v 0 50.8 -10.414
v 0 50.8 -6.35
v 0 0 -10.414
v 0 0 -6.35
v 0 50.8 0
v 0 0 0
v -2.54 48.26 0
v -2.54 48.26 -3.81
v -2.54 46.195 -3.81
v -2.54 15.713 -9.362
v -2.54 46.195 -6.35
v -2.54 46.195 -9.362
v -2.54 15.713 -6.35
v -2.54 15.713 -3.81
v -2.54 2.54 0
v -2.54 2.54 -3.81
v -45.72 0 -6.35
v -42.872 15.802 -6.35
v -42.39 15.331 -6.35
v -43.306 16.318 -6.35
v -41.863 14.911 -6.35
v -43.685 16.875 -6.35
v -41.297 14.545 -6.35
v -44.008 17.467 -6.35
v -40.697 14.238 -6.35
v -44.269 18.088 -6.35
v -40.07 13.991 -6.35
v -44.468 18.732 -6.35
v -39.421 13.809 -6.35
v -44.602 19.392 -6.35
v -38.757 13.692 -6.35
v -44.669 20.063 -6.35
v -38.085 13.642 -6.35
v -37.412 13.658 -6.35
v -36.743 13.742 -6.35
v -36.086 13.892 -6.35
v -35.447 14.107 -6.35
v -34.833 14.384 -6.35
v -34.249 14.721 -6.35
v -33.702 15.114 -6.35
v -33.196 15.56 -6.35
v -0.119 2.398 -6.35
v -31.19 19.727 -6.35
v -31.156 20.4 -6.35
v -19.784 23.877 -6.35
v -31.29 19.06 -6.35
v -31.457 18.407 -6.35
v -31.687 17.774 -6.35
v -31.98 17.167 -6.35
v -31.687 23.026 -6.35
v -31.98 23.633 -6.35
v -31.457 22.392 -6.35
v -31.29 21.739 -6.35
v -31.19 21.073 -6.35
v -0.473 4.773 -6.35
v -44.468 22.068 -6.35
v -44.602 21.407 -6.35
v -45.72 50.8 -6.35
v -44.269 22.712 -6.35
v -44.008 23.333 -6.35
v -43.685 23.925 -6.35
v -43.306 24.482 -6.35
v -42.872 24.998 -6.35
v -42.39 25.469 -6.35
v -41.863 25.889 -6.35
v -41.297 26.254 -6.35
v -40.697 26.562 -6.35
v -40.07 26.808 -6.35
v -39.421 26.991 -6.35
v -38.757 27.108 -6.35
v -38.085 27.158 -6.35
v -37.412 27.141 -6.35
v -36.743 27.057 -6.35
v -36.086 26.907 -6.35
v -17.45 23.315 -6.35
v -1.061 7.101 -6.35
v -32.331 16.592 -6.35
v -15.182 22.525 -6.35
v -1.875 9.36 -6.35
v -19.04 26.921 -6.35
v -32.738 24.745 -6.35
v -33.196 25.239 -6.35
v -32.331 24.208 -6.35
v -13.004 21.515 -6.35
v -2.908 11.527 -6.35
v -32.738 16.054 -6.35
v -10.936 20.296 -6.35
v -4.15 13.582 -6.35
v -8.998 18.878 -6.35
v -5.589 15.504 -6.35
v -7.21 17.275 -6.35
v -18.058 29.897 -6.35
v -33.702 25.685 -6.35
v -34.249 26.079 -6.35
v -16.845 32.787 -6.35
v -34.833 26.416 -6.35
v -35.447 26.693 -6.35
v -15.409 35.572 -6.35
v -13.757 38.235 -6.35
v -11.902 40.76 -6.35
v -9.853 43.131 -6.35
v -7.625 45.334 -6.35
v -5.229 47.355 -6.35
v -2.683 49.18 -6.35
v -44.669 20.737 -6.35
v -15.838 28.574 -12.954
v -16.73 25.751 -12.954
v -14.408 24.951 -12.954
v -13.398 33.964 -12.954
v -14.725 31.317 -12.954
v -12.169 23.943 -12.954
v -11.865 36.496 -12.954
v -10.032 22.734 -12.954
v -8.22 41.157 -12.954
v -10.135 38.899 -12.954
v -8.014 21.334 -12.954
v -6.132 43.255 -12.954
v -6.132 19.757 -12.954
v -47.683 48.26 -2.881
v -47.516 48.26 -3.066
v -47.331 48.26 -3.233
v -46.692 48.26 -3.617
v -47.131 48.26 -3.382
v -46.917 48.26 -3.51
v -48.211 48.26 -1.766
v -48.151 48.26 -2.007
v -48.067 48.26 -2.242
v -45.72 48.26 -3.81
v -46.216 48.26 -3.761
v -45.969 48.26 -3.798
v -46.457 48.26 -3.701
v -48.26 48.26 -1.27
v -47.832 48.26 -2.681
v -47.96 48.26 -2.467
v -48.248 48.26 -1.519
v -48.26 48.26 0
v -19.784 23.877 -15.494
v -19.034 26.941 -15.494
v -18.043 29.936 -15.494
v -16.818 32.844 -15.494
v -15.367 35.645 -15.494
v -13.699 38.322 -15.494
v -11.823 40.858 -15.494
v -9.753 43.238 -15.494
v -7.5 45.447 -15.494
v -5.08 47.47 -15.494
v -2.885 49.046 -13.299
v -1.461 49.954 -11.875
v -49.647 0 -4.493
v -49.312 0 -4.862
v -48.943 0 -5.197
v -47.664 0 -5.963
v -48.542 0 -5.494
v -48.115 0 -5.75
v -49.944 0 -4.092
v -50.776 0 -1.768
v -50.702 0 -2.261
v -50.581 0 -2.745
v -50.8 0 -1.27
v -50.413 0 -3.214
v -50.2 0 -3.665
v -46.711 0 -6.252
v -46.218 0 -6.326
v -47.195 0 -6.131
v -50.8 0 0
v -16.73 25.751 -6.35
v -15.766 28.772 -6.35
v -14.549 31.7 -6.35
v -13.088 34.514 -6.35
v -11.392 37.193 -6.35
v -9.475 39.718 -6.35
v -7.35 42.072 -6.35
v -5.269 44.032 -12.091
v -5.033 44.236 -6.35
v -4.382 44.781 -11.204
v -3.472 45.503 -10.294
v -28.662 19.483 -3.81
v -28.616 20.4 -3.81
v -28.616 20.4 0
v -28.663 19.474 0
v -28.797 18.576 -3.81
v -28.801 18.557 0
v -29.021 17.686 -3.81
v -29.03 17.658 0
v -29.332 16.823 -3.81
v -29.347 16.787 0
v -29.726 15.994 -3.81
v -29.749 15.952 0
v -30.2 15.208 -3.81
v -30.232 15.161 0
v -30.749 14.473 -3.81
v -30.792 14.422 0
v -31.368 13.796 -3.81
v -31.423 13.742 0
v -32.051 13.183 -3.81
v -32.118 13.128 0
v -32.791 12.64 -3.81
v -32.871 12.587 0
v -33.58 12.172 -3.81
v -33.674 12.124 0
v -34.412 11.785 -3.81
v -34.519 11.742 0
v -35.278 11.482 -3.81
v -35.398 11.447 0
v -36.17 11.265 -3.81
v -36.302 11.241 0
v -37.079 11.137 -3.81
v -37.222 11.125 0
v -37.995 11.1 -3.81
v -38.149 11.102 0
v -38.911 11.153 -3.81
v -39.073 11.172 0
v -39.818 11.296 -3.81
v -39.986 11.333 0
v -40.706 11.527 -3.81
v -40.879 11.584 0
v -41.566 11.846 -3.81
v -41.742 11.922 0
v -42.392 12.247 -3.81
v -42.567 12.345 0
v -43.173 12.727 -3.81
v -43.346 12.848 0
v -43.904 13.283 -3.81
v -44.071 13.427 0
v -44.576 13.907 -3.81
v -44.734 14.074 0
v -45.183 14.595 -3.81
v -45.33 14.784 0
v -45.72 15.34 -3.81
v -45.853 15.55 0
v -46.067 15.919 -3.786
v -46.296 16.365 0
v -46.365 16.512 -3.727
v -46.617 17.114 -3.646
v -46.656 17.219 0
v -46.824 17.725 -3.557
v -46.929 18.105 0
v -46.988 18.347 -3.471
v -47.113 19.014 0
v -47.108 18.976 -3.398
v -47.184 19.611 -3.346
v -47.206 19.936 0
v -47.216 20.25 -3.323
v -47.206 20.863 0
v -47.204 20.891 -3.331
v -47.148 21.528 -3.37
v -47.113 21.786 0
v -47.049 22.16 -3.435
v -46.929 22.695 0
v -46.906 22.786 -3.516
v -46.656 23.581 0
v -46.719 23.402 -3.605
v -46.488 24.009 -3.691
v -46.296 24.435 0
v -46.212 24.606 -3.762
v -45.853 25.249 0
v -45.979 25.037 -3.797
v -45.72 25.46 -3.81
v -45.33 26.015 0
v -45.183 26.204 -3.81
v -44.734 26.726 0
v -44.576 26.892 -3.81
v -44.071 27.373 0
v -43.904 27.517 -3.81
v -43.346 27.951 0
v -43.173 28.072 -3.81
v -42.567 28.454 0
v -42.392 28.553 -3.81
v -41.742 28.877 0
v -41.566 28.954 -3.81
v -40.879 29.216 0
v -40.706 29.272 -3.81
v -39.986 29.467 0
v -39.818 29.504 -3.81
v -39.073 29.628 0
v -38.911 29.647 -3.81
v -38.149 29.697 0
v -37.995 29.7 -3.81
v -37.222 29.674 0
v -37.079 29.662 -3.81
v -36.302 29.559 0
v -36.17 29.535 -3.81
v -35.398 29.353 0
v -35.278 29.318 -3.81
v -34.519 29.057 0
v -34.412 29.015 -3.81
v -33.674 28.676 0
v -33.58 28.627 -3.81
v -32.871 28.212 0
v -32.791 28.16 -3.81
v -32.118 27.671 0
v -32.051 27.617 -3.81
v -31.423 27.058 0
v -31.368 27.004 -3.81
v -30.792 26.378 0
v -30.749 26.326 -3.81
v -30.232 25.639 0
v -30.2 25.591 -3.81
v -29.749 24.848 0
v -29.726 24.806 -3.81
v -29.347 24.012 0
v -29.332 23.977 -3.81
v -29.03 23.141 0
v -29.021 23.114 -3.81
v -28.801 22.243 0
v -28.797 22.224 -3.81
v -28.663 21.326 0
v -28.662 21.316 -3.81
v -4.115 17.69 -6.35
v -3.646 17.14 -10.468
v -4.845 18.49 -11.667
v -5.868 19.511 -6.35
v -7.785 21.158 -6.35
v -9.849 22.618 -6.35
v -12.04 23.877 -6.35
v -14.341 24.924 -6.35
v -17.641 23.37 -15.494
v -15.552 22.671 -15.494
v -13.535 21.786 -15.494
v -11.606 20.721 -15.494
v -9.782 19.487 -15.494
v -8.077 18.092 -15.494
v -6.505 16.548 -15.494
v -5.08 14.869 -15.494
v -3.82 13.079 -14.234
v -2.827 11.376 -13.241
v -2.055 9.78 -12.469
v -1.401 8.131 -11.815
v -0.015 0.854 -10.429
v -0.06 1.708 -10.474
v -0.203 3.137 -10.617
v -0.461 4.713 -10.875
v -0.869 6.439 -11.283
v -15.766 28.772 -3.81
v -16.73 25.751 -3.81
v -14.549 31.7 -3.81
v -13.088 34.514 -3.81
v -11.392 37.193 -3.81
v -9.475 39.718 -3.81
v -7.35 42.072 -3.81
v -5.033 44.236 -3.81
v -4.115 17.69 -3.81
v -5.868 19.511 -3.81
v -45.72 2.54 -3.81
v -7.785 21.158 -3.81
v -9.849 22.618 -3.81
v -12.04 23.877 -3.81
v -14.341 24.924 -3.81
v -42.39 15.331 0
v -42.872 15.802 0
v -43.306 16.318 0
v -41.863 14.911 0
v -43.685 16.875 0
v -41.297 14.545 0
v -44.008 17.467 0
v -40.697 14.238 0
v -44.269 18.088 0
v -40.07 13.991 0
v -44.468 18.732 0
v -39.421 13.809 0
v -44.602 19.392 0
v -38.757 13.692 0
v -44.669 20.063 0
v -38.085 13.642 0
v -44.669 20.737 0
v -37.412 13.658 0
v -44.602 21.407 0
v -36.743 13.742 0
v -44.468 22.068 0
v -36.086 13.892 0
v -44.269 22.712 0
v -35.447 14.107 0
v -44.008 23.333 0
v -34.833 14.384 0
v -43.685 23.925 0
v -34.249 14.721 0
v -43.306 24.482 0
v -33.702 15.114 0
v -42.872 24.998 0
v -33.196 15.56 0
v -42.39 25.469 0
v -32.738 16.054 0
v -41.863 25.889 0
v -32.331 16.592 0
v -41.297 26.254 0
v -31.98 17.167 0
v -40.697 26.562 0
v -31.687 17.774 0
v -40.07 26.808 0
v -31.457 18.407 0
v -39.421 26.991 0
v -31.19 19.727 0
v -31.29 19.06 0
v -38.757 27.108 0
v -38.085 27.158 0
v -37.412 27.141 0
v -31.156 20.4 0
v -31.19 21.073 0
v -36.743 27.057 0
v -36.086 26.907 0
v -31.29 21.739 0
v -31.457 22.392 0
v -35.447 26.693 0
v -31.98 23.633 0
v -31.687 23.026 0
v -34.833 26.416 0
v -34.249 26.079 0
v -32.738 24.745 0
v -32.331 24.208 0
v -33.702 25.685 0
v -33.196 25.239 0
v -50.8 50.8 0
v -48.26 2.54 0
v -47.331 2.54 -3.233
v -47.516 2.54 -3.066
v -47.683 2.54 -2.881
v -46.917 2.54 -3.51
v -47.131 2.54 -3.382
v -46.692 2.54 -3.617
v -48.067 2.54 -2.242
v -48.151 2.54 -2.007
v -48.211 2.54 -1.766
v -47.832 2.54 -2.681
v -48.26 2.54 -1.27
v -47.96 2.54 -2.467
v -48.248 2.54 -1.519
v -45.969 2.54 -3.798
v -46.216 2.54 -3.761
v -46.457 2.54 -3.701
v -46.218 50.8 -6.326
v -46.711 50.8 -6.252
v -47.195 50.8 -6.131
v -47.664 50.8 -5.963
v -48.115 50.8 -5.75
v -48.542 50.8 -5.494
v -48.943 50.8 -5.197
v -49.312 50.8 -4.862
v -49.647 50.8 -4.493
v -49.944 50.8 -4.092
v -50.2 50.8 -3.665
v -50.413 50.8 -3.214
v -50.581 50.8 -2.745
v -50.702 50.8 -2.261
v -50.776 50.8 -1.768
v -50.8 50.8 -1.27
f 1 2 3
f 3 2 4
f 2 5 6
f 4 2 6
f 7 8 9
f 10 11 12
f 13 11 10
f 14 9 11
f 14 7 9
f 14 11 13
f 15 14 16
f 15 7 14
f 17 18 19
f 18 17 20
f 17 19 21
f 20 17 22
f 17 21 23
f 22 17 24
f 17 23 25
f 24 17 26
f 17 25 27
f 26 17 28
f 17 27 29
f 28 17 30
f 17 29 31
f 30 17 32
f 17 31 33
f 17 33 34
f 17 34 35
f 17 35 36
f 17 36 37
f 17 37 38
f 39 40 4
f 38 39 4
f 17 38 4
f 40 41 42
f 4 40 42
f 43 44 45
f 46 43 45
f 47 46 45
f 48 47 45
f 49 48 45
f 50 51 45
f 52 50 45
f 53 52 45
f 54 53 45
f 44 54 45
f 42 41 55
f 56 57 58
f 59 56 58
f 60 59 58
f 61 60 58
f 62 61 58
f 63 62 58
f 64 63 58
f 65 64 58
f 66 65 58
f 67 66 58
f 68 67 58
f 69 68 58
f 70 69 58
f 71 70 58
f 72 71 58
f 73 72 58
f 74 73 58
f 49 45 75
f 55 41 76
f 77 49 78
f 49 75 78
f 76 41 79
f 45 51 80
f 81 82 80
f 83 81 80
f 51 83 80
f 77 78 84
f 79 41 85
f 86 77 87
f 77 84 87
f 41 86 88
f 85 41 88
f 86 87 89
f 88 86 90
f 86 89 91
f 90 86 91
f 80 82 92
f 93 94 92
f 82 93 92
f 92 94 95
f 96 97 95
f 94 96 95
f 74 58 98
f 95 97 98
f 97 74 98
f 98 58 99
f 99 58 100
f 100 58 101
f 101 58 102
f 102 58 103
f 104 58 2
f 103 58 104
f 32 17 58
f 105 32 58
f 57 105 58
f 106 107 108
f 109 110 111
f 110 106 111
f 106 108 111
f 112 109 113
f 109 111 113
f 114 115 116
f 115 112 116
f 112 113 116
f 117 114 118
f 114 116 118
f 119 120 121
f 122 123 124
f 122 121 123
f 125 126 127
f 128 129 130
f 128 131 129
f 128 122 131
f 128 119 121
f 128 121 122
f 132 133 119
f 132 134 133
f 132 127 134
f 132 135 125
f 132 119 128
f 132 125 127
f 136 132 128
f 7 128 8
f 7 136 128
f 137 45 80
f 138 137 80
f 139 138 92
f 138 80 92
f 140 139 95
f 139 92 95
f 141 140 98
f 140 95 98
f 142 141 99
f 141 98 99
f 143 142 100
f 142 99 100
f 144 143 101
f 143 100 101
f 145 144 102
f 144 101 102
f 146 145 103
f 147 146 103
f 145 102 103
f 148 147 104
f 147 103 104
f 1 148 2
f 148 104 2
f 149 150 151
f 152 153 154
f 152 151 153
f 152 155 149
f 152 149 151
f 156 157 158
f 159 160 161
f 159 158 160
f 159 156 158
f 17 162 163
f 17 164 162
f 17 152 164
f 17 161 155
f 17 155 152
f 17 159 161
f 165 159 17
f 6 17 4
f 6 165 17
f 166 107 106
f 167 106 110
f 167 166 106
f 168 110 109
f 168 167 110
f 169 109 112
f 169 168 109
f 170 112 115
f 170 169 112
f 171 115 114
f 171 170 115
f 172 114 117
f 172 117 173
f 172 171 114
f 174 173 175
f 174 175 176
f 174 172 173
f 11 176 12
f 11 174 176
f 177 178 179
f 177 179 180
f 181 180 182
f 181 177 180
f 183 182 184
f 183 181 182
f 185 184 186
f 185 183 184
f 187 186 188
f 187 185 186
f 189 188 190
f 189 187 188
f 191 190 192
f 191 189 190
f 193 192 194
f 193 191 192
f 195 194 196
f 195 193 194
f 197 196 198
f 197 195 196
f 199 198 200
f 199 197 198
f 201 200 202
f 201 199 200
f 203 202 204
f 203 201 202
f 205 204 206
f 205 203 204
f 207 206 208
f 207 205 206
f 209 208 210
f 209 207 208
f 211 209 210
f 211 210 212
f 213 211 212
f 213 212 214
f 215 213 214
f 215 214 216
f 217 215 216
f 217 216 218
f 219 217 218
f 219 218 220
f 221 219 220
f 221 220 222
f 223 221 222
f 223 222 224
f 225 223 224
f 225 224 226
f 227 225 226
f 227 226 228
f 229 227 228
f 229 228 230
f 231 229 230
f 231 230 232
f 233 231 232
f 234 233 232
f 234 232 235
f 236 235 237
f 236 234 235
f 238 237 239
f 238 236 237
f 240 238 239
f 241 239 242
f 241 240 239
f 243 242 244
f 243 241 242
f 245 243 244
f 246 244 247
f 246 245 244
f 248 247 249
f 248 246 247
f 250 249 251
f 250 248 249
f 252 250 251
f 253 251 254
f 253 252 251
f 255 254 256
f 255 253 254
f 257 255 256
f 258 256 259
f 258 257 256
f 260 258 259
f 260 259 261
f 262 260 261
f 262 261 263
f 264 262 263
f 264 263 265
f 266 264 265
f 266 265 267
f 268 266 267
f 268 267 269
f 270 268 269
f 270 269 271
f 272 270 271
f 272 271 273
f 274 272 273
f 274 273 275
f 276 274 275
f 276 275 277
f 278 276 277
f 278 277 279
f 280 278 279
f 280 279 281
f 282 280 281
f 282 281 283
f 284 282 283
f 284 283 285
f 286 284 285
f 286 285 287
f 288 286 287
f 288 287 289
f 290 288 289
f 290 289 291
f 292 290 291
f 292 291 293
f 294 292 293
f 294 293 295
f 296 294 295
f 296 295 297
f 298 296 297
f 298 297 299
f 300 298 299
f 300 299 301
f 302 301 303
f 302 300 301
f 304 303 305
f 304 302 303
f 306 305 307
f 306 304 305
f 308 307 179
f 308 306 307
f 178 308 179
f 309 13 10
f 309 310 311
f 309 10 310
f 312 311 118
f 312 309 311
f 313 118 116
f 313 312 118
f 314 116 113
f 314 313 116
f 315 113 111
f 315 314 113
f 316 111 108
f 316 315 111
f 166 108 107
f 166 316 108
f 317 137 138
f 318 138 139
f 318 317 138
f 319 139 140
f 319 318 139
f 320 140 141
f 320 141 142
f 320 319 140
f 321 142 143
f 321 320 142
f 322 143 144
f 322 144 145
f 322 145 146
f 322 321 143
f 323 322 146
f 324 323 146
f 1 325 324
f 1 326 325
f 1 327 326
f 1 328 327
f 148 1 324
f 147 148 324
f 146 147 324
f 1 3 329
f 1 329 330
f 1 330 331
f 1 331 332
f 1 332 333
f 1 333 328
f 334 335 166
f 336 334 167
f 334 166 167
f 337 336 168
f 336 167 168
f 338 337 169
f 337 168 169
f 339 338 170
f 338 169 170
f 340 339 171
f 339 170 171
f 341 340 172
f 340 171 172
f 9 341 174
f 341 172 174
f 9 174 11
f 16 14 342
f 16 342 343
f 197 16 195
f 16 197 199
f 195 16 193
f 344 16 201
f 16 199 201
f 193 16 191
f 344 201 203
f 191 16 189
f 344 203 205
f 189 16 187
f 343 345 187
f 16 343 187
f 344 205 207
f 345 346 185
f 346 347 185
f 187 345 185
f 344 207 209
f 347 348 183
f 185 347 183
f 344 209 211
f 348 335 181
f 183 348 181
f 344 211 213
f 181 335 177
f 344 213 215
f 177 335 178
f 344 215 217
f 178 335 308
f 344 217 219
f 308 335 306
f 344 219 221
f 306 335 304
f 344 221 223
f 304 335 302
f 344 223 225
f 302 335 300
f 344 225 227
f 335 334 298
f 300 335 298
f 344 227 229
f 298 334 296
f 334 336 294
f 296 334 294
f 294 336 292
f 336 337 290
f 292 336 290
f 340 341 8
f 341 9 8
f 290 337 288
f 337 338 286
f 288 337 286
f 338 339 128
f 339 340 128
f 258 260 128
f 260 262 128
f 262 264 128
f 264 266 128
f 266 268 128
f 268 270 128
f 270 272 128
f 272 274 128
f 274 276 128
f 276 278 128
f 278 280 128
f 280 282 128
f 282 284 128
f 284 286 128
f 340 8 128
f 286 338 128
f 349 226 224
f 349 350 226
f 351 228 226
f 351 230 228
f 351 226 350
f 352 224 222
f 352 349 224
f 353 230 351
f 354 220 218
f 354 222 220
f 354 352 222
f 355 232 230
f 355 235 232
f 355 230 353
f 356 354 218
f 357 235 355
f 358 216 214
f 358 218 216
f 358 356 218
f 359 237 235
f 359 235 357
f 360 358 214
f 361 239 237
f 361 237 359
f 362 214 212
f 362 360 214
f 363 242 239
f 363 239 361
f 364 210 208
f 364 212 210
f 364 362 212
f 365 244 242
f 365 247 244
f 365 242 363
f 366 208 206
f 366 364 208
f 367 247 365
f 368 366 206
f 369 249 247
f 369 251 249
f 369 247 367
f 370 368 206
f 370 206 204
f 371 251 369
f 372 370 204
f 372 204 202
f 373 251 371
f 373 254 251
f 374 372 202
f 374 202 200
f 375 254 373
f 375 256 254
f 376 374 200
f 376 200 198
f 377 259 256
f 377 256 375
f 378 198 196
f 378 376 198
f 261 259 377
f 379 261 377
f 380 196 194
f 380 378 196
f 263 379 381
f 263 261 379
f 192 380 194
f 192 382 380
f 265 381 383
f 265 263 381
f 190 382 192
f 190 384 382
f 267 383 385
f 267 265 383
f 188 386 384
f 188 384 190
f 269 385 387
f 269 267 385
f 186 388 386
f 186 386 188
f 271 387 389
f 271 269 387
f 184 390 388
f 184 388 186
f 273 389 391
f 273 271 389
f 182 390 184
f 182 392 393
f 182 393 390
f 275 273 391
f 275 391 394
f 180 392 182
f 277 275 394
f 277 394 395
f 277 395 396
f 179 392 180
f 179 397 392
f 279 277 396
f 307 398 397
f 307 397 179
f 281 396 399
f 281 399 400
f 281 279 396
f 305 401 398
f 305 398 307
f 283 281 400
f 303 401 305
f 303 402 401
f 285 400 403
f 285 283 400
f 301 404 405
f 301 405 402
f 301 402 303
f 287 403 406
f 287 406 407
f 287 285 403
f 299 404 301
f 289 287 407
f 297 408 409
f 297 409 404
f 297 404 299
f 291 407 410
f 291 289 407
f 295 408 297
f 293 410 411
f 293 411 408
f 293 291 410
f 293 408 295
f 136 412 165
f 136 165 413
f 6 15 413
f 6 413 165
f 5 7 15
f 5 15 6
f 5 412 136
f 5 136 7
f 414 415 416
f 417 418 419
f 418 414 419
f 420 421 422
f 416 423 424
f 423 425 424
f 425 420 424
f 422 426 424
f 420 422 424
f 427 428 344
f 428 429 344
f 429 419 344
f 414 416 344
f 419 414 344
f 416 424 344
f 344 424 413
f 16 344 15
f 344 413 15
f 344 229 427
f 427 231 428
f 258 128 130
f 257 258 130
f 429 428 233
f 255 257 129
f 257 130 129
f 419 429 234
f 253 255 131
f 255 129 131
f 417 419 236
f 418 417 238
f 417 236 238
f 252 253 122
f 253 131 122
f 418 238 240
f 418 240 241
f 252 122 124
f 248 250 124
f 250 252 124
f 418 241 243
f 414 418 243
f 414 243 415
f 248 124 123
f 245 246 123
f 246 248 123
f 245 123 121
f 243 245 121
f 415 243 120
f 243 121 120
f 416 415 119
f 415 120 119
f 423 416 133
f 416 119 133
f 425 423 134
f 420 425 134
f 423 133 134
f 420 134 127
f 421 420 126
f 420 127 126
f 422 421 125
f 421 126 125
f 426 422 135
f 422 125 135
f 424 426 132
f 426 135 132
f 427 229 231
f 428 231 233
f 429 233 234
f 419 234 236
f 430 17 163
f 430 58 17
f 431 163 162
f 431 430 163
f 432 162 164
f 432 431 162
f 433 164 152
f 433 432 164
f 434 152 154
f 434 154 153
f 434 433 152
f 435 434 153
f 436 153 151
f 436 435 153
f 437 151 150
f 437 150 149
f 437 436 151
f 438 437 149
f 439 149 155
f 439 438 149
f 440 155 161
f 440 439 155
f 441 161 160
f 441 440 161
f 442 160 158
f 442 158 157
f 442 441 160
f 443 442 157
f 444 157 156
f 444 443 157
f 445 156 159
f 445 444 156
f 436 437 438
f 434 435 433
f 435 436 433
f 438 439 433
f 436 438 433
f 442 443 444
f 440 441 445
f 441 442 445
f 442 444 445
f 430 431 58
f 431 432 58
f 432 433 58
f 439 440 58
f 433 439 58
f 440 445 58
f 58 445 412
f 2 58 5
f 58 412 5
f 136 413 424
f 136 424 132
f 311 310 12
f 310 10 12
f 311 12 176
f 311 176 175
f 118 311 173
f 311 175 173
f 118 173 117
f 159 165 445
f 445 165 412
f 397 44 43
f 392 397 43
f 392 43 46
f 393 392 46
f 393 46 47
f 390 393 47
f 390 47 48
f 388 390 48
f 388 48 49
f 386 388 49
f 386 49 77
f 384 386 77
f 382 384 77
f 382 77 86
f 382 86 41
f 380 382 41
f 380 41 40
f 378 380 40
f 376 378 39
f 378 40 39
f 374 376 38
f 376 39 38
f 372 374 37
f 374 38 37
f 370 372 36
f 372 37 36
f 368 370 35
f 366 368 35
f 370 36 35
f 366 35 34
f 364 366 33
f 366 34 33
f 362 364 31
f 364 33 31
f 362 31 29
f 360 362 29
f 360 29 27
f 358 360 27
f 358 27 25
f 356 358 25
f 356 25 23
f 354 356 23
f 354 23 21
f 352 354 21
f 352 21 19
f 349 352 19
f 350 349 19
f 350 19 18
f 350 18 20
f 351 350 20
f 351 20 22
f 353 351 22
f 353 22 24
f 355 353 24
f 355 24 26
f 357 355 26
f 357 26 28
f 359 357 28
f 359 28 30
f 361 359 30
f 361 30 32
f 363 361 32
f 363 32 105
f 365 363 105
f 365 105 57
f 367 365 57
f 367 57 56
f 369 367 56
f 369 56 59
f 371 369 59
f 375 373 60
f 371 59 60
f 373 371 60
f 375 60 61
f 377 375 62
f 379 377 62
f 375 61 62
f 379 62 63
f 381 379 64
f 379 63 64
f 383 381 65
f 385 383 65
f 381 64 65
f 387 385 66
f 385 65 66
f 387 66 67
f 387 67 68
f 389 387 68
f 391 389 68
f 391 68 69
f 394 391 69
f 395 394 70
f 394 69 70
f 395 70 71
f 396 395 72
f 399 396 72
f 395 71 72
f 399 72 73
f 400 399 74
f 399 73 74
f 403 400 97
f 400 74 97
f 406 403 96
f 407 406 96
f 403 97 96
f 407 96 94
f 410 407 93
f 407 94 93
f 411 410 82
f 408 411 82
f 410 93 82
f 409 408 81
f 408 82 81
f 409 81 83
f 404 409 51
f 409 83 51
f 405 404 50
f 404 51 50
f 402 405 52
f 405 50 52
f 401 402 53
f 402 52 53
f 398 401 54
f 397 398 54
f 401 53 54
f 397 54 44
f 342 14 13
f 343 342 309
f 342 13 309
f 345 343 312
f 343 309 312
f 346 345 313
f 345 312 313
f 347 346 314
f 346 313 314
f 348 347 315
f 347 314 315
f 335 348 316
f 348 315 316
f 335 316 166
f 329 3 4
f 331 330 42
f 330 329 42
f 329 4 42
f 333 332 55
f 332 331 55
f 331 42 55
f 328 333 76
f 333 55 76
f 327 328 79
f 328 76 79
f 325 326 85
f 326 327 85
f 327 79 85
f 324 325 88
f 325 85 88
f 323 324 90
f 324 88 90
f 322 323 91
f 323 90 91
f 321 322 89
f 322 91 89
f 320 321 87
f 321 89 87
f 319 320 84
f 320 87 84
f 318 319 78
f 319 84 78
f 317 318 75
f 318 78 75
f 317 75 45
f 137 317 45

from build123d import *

# Parameters (mm, degrees)
F0_W        = 50.8
F0_H        = 50.8
F1_DEPTH    = 6.35
F3_DEPTH    = 9.144
F2_R        = 6.7603485979
F4_DEPTH    = 25.4
F5_R        = 5.08
F6_T1_DEPTH = 86.0732038629
F7_T        = 2.54
F7_T4_ANGLE = 49.6458001059
F7_T6_ANGLE = 79.2883730852


# Not quite as in the source:
# - a fillet or chamfer that OpenCascade refuses, or shapes differently, is made with other operations: its cross-section is extruded or revolved along the edge and cut away or added
# - a shell that OpenCascade refuses in one call is made with other operations: the cavity is built on its own and cut out


with BuildPart() as f1:
    # F0 (on Top) → F1 (new body)
    with BuildSketch(Plane.XY):
        with Locations((-25.4, 25.4)):
            Rectangle(F0_W, F0_H)
    extrude(amount=-F1_DEPTH)

    # F2 (on face) → F3 (join)
    with BuildSketch(Plane(origin=(0, 0, -6.35), x_dir=(1, 0, 0), z_dir=(0, 0, -1))):
        with BuildLine():
            ThreePointArc((0, 0), (-5.5886686099, -15.504363354), (-19.7841264307, -23.8773841411))
            ThreePointArc((-19.7841264307, -23.8773841411), (-12.8545439956, -39.5156757118), (0, -50.8))
            Line((0, -50.8), (0, 0))
        make_face()
    extrude(amount=F3_DEPTH)

    # F2 (on face) → F4 (cut)
    with BuildSketch(Plane(origin=(0, 0, -6.35), x_dir=(1, 0, 0), z_dir=(0, 0, -1))):
        with Locations((-37.9167422652, -20.3997846693)):
            Circle(F2_R)
    extrude(amount=-F4_DEPTH, mode=Mode.SUBTRACT)

    # F5
    f5_edges = [f1.edges().sort_by_distance(p)[0] for p in [
        (-50.8, 25.4, -6.35),
    ]]
    fillet(f5_edges, radius=F5_R)

    # F6: chamfer of 5.08 on 1 edges, made by hand

    # F6_s2 → F6_t1 (cut)
    with BuildSketch(Plane.XZ.offset(-63.8641495789)):
        Polygon((0, -10.414), (-5.08, -15.494), (0, -15.494), align=None)
    extrude(amount=F6_T1_DEPTH, mode=Mode.SUBTRACT)

    # F7: shell of thickness 2.54, made by hand


with BuildPart() as f7_core1:
    # F7_t2: copy of F1
    add(f1.part)

    # the walls: a layer under each face that stays
    f7_faces = [f7_core1.faces().sort_by_distance(p)[0] for p in [
        (-25.4, 0, -3.175),
        (-50.8, 25.4, -0.635),
        (-49.3121024484, 25.4, -4.8621024484),
        (-22.86, 25.4, -6.35),
        (0, 25.4, -5.207),
        (-25.4, 50.8, -3.175),
        (-44.6770908632, 20.3997846693, -3.175),
        (-12.8545439956, 39.5156757118, -10.922),
        (-5.5886686099, 15.504363354, -10.922),
        (-2.54, 25.4, -12.954),
        (-12.4320632154, 31.169630086, -15.494),
    ]]
    thicken(f7_faces, amount=-F7_T, mode=Mode.SUBTRACT)

    # F7_s3 → F7_t4 (revolve, cut)
    with BuildSketch(Plane(origin=(3.8753287702, 19.0692040386, 0), x_dir=(0, 0, 1), z_dir=(-0.1991535327, -0.9799683007, 0))):
        Polygon((-6.3754, 24.1684821625), (-3.81, 24.1430821625), (-3.81, 21.6030821625), (-6.35, 21.6030821625), align=None)
    revolve(axis=Axis((19.2103228569, 15.9527580845, -6.35), (0, 0, -1)), revolution_arc=F7_T4_ANGLE, mode=Mode.SUBTRACT)

    # F7_s5 → F7_t6 (revolve, cut)
    with BuildSketch(Plane.XZ):
        Polygon((-0.0254, -6.3754), (0, -3.81), (2.54, -3.81), (2.54, -6.35), align=None)
    revolve(axis=Axis((-24.3008235773, 0, -6.35), (0, 0, 1)), revolution_arc=F7_T6_ANGLE, mode=Mode.SUBTRACT)


with BuildPart() as f1_1:
    add(f1.part)

    # what is left inside the walls is the cavity
    f7_cavity = [f7_core1.part.solids().sort_by_distance(p)[0] for p in [
        (-25.4, 17.78, -0.0254),
    ]]
    add(f7_cavity, mode=Mode.SUBTRACT)


solid = f1_1.part
